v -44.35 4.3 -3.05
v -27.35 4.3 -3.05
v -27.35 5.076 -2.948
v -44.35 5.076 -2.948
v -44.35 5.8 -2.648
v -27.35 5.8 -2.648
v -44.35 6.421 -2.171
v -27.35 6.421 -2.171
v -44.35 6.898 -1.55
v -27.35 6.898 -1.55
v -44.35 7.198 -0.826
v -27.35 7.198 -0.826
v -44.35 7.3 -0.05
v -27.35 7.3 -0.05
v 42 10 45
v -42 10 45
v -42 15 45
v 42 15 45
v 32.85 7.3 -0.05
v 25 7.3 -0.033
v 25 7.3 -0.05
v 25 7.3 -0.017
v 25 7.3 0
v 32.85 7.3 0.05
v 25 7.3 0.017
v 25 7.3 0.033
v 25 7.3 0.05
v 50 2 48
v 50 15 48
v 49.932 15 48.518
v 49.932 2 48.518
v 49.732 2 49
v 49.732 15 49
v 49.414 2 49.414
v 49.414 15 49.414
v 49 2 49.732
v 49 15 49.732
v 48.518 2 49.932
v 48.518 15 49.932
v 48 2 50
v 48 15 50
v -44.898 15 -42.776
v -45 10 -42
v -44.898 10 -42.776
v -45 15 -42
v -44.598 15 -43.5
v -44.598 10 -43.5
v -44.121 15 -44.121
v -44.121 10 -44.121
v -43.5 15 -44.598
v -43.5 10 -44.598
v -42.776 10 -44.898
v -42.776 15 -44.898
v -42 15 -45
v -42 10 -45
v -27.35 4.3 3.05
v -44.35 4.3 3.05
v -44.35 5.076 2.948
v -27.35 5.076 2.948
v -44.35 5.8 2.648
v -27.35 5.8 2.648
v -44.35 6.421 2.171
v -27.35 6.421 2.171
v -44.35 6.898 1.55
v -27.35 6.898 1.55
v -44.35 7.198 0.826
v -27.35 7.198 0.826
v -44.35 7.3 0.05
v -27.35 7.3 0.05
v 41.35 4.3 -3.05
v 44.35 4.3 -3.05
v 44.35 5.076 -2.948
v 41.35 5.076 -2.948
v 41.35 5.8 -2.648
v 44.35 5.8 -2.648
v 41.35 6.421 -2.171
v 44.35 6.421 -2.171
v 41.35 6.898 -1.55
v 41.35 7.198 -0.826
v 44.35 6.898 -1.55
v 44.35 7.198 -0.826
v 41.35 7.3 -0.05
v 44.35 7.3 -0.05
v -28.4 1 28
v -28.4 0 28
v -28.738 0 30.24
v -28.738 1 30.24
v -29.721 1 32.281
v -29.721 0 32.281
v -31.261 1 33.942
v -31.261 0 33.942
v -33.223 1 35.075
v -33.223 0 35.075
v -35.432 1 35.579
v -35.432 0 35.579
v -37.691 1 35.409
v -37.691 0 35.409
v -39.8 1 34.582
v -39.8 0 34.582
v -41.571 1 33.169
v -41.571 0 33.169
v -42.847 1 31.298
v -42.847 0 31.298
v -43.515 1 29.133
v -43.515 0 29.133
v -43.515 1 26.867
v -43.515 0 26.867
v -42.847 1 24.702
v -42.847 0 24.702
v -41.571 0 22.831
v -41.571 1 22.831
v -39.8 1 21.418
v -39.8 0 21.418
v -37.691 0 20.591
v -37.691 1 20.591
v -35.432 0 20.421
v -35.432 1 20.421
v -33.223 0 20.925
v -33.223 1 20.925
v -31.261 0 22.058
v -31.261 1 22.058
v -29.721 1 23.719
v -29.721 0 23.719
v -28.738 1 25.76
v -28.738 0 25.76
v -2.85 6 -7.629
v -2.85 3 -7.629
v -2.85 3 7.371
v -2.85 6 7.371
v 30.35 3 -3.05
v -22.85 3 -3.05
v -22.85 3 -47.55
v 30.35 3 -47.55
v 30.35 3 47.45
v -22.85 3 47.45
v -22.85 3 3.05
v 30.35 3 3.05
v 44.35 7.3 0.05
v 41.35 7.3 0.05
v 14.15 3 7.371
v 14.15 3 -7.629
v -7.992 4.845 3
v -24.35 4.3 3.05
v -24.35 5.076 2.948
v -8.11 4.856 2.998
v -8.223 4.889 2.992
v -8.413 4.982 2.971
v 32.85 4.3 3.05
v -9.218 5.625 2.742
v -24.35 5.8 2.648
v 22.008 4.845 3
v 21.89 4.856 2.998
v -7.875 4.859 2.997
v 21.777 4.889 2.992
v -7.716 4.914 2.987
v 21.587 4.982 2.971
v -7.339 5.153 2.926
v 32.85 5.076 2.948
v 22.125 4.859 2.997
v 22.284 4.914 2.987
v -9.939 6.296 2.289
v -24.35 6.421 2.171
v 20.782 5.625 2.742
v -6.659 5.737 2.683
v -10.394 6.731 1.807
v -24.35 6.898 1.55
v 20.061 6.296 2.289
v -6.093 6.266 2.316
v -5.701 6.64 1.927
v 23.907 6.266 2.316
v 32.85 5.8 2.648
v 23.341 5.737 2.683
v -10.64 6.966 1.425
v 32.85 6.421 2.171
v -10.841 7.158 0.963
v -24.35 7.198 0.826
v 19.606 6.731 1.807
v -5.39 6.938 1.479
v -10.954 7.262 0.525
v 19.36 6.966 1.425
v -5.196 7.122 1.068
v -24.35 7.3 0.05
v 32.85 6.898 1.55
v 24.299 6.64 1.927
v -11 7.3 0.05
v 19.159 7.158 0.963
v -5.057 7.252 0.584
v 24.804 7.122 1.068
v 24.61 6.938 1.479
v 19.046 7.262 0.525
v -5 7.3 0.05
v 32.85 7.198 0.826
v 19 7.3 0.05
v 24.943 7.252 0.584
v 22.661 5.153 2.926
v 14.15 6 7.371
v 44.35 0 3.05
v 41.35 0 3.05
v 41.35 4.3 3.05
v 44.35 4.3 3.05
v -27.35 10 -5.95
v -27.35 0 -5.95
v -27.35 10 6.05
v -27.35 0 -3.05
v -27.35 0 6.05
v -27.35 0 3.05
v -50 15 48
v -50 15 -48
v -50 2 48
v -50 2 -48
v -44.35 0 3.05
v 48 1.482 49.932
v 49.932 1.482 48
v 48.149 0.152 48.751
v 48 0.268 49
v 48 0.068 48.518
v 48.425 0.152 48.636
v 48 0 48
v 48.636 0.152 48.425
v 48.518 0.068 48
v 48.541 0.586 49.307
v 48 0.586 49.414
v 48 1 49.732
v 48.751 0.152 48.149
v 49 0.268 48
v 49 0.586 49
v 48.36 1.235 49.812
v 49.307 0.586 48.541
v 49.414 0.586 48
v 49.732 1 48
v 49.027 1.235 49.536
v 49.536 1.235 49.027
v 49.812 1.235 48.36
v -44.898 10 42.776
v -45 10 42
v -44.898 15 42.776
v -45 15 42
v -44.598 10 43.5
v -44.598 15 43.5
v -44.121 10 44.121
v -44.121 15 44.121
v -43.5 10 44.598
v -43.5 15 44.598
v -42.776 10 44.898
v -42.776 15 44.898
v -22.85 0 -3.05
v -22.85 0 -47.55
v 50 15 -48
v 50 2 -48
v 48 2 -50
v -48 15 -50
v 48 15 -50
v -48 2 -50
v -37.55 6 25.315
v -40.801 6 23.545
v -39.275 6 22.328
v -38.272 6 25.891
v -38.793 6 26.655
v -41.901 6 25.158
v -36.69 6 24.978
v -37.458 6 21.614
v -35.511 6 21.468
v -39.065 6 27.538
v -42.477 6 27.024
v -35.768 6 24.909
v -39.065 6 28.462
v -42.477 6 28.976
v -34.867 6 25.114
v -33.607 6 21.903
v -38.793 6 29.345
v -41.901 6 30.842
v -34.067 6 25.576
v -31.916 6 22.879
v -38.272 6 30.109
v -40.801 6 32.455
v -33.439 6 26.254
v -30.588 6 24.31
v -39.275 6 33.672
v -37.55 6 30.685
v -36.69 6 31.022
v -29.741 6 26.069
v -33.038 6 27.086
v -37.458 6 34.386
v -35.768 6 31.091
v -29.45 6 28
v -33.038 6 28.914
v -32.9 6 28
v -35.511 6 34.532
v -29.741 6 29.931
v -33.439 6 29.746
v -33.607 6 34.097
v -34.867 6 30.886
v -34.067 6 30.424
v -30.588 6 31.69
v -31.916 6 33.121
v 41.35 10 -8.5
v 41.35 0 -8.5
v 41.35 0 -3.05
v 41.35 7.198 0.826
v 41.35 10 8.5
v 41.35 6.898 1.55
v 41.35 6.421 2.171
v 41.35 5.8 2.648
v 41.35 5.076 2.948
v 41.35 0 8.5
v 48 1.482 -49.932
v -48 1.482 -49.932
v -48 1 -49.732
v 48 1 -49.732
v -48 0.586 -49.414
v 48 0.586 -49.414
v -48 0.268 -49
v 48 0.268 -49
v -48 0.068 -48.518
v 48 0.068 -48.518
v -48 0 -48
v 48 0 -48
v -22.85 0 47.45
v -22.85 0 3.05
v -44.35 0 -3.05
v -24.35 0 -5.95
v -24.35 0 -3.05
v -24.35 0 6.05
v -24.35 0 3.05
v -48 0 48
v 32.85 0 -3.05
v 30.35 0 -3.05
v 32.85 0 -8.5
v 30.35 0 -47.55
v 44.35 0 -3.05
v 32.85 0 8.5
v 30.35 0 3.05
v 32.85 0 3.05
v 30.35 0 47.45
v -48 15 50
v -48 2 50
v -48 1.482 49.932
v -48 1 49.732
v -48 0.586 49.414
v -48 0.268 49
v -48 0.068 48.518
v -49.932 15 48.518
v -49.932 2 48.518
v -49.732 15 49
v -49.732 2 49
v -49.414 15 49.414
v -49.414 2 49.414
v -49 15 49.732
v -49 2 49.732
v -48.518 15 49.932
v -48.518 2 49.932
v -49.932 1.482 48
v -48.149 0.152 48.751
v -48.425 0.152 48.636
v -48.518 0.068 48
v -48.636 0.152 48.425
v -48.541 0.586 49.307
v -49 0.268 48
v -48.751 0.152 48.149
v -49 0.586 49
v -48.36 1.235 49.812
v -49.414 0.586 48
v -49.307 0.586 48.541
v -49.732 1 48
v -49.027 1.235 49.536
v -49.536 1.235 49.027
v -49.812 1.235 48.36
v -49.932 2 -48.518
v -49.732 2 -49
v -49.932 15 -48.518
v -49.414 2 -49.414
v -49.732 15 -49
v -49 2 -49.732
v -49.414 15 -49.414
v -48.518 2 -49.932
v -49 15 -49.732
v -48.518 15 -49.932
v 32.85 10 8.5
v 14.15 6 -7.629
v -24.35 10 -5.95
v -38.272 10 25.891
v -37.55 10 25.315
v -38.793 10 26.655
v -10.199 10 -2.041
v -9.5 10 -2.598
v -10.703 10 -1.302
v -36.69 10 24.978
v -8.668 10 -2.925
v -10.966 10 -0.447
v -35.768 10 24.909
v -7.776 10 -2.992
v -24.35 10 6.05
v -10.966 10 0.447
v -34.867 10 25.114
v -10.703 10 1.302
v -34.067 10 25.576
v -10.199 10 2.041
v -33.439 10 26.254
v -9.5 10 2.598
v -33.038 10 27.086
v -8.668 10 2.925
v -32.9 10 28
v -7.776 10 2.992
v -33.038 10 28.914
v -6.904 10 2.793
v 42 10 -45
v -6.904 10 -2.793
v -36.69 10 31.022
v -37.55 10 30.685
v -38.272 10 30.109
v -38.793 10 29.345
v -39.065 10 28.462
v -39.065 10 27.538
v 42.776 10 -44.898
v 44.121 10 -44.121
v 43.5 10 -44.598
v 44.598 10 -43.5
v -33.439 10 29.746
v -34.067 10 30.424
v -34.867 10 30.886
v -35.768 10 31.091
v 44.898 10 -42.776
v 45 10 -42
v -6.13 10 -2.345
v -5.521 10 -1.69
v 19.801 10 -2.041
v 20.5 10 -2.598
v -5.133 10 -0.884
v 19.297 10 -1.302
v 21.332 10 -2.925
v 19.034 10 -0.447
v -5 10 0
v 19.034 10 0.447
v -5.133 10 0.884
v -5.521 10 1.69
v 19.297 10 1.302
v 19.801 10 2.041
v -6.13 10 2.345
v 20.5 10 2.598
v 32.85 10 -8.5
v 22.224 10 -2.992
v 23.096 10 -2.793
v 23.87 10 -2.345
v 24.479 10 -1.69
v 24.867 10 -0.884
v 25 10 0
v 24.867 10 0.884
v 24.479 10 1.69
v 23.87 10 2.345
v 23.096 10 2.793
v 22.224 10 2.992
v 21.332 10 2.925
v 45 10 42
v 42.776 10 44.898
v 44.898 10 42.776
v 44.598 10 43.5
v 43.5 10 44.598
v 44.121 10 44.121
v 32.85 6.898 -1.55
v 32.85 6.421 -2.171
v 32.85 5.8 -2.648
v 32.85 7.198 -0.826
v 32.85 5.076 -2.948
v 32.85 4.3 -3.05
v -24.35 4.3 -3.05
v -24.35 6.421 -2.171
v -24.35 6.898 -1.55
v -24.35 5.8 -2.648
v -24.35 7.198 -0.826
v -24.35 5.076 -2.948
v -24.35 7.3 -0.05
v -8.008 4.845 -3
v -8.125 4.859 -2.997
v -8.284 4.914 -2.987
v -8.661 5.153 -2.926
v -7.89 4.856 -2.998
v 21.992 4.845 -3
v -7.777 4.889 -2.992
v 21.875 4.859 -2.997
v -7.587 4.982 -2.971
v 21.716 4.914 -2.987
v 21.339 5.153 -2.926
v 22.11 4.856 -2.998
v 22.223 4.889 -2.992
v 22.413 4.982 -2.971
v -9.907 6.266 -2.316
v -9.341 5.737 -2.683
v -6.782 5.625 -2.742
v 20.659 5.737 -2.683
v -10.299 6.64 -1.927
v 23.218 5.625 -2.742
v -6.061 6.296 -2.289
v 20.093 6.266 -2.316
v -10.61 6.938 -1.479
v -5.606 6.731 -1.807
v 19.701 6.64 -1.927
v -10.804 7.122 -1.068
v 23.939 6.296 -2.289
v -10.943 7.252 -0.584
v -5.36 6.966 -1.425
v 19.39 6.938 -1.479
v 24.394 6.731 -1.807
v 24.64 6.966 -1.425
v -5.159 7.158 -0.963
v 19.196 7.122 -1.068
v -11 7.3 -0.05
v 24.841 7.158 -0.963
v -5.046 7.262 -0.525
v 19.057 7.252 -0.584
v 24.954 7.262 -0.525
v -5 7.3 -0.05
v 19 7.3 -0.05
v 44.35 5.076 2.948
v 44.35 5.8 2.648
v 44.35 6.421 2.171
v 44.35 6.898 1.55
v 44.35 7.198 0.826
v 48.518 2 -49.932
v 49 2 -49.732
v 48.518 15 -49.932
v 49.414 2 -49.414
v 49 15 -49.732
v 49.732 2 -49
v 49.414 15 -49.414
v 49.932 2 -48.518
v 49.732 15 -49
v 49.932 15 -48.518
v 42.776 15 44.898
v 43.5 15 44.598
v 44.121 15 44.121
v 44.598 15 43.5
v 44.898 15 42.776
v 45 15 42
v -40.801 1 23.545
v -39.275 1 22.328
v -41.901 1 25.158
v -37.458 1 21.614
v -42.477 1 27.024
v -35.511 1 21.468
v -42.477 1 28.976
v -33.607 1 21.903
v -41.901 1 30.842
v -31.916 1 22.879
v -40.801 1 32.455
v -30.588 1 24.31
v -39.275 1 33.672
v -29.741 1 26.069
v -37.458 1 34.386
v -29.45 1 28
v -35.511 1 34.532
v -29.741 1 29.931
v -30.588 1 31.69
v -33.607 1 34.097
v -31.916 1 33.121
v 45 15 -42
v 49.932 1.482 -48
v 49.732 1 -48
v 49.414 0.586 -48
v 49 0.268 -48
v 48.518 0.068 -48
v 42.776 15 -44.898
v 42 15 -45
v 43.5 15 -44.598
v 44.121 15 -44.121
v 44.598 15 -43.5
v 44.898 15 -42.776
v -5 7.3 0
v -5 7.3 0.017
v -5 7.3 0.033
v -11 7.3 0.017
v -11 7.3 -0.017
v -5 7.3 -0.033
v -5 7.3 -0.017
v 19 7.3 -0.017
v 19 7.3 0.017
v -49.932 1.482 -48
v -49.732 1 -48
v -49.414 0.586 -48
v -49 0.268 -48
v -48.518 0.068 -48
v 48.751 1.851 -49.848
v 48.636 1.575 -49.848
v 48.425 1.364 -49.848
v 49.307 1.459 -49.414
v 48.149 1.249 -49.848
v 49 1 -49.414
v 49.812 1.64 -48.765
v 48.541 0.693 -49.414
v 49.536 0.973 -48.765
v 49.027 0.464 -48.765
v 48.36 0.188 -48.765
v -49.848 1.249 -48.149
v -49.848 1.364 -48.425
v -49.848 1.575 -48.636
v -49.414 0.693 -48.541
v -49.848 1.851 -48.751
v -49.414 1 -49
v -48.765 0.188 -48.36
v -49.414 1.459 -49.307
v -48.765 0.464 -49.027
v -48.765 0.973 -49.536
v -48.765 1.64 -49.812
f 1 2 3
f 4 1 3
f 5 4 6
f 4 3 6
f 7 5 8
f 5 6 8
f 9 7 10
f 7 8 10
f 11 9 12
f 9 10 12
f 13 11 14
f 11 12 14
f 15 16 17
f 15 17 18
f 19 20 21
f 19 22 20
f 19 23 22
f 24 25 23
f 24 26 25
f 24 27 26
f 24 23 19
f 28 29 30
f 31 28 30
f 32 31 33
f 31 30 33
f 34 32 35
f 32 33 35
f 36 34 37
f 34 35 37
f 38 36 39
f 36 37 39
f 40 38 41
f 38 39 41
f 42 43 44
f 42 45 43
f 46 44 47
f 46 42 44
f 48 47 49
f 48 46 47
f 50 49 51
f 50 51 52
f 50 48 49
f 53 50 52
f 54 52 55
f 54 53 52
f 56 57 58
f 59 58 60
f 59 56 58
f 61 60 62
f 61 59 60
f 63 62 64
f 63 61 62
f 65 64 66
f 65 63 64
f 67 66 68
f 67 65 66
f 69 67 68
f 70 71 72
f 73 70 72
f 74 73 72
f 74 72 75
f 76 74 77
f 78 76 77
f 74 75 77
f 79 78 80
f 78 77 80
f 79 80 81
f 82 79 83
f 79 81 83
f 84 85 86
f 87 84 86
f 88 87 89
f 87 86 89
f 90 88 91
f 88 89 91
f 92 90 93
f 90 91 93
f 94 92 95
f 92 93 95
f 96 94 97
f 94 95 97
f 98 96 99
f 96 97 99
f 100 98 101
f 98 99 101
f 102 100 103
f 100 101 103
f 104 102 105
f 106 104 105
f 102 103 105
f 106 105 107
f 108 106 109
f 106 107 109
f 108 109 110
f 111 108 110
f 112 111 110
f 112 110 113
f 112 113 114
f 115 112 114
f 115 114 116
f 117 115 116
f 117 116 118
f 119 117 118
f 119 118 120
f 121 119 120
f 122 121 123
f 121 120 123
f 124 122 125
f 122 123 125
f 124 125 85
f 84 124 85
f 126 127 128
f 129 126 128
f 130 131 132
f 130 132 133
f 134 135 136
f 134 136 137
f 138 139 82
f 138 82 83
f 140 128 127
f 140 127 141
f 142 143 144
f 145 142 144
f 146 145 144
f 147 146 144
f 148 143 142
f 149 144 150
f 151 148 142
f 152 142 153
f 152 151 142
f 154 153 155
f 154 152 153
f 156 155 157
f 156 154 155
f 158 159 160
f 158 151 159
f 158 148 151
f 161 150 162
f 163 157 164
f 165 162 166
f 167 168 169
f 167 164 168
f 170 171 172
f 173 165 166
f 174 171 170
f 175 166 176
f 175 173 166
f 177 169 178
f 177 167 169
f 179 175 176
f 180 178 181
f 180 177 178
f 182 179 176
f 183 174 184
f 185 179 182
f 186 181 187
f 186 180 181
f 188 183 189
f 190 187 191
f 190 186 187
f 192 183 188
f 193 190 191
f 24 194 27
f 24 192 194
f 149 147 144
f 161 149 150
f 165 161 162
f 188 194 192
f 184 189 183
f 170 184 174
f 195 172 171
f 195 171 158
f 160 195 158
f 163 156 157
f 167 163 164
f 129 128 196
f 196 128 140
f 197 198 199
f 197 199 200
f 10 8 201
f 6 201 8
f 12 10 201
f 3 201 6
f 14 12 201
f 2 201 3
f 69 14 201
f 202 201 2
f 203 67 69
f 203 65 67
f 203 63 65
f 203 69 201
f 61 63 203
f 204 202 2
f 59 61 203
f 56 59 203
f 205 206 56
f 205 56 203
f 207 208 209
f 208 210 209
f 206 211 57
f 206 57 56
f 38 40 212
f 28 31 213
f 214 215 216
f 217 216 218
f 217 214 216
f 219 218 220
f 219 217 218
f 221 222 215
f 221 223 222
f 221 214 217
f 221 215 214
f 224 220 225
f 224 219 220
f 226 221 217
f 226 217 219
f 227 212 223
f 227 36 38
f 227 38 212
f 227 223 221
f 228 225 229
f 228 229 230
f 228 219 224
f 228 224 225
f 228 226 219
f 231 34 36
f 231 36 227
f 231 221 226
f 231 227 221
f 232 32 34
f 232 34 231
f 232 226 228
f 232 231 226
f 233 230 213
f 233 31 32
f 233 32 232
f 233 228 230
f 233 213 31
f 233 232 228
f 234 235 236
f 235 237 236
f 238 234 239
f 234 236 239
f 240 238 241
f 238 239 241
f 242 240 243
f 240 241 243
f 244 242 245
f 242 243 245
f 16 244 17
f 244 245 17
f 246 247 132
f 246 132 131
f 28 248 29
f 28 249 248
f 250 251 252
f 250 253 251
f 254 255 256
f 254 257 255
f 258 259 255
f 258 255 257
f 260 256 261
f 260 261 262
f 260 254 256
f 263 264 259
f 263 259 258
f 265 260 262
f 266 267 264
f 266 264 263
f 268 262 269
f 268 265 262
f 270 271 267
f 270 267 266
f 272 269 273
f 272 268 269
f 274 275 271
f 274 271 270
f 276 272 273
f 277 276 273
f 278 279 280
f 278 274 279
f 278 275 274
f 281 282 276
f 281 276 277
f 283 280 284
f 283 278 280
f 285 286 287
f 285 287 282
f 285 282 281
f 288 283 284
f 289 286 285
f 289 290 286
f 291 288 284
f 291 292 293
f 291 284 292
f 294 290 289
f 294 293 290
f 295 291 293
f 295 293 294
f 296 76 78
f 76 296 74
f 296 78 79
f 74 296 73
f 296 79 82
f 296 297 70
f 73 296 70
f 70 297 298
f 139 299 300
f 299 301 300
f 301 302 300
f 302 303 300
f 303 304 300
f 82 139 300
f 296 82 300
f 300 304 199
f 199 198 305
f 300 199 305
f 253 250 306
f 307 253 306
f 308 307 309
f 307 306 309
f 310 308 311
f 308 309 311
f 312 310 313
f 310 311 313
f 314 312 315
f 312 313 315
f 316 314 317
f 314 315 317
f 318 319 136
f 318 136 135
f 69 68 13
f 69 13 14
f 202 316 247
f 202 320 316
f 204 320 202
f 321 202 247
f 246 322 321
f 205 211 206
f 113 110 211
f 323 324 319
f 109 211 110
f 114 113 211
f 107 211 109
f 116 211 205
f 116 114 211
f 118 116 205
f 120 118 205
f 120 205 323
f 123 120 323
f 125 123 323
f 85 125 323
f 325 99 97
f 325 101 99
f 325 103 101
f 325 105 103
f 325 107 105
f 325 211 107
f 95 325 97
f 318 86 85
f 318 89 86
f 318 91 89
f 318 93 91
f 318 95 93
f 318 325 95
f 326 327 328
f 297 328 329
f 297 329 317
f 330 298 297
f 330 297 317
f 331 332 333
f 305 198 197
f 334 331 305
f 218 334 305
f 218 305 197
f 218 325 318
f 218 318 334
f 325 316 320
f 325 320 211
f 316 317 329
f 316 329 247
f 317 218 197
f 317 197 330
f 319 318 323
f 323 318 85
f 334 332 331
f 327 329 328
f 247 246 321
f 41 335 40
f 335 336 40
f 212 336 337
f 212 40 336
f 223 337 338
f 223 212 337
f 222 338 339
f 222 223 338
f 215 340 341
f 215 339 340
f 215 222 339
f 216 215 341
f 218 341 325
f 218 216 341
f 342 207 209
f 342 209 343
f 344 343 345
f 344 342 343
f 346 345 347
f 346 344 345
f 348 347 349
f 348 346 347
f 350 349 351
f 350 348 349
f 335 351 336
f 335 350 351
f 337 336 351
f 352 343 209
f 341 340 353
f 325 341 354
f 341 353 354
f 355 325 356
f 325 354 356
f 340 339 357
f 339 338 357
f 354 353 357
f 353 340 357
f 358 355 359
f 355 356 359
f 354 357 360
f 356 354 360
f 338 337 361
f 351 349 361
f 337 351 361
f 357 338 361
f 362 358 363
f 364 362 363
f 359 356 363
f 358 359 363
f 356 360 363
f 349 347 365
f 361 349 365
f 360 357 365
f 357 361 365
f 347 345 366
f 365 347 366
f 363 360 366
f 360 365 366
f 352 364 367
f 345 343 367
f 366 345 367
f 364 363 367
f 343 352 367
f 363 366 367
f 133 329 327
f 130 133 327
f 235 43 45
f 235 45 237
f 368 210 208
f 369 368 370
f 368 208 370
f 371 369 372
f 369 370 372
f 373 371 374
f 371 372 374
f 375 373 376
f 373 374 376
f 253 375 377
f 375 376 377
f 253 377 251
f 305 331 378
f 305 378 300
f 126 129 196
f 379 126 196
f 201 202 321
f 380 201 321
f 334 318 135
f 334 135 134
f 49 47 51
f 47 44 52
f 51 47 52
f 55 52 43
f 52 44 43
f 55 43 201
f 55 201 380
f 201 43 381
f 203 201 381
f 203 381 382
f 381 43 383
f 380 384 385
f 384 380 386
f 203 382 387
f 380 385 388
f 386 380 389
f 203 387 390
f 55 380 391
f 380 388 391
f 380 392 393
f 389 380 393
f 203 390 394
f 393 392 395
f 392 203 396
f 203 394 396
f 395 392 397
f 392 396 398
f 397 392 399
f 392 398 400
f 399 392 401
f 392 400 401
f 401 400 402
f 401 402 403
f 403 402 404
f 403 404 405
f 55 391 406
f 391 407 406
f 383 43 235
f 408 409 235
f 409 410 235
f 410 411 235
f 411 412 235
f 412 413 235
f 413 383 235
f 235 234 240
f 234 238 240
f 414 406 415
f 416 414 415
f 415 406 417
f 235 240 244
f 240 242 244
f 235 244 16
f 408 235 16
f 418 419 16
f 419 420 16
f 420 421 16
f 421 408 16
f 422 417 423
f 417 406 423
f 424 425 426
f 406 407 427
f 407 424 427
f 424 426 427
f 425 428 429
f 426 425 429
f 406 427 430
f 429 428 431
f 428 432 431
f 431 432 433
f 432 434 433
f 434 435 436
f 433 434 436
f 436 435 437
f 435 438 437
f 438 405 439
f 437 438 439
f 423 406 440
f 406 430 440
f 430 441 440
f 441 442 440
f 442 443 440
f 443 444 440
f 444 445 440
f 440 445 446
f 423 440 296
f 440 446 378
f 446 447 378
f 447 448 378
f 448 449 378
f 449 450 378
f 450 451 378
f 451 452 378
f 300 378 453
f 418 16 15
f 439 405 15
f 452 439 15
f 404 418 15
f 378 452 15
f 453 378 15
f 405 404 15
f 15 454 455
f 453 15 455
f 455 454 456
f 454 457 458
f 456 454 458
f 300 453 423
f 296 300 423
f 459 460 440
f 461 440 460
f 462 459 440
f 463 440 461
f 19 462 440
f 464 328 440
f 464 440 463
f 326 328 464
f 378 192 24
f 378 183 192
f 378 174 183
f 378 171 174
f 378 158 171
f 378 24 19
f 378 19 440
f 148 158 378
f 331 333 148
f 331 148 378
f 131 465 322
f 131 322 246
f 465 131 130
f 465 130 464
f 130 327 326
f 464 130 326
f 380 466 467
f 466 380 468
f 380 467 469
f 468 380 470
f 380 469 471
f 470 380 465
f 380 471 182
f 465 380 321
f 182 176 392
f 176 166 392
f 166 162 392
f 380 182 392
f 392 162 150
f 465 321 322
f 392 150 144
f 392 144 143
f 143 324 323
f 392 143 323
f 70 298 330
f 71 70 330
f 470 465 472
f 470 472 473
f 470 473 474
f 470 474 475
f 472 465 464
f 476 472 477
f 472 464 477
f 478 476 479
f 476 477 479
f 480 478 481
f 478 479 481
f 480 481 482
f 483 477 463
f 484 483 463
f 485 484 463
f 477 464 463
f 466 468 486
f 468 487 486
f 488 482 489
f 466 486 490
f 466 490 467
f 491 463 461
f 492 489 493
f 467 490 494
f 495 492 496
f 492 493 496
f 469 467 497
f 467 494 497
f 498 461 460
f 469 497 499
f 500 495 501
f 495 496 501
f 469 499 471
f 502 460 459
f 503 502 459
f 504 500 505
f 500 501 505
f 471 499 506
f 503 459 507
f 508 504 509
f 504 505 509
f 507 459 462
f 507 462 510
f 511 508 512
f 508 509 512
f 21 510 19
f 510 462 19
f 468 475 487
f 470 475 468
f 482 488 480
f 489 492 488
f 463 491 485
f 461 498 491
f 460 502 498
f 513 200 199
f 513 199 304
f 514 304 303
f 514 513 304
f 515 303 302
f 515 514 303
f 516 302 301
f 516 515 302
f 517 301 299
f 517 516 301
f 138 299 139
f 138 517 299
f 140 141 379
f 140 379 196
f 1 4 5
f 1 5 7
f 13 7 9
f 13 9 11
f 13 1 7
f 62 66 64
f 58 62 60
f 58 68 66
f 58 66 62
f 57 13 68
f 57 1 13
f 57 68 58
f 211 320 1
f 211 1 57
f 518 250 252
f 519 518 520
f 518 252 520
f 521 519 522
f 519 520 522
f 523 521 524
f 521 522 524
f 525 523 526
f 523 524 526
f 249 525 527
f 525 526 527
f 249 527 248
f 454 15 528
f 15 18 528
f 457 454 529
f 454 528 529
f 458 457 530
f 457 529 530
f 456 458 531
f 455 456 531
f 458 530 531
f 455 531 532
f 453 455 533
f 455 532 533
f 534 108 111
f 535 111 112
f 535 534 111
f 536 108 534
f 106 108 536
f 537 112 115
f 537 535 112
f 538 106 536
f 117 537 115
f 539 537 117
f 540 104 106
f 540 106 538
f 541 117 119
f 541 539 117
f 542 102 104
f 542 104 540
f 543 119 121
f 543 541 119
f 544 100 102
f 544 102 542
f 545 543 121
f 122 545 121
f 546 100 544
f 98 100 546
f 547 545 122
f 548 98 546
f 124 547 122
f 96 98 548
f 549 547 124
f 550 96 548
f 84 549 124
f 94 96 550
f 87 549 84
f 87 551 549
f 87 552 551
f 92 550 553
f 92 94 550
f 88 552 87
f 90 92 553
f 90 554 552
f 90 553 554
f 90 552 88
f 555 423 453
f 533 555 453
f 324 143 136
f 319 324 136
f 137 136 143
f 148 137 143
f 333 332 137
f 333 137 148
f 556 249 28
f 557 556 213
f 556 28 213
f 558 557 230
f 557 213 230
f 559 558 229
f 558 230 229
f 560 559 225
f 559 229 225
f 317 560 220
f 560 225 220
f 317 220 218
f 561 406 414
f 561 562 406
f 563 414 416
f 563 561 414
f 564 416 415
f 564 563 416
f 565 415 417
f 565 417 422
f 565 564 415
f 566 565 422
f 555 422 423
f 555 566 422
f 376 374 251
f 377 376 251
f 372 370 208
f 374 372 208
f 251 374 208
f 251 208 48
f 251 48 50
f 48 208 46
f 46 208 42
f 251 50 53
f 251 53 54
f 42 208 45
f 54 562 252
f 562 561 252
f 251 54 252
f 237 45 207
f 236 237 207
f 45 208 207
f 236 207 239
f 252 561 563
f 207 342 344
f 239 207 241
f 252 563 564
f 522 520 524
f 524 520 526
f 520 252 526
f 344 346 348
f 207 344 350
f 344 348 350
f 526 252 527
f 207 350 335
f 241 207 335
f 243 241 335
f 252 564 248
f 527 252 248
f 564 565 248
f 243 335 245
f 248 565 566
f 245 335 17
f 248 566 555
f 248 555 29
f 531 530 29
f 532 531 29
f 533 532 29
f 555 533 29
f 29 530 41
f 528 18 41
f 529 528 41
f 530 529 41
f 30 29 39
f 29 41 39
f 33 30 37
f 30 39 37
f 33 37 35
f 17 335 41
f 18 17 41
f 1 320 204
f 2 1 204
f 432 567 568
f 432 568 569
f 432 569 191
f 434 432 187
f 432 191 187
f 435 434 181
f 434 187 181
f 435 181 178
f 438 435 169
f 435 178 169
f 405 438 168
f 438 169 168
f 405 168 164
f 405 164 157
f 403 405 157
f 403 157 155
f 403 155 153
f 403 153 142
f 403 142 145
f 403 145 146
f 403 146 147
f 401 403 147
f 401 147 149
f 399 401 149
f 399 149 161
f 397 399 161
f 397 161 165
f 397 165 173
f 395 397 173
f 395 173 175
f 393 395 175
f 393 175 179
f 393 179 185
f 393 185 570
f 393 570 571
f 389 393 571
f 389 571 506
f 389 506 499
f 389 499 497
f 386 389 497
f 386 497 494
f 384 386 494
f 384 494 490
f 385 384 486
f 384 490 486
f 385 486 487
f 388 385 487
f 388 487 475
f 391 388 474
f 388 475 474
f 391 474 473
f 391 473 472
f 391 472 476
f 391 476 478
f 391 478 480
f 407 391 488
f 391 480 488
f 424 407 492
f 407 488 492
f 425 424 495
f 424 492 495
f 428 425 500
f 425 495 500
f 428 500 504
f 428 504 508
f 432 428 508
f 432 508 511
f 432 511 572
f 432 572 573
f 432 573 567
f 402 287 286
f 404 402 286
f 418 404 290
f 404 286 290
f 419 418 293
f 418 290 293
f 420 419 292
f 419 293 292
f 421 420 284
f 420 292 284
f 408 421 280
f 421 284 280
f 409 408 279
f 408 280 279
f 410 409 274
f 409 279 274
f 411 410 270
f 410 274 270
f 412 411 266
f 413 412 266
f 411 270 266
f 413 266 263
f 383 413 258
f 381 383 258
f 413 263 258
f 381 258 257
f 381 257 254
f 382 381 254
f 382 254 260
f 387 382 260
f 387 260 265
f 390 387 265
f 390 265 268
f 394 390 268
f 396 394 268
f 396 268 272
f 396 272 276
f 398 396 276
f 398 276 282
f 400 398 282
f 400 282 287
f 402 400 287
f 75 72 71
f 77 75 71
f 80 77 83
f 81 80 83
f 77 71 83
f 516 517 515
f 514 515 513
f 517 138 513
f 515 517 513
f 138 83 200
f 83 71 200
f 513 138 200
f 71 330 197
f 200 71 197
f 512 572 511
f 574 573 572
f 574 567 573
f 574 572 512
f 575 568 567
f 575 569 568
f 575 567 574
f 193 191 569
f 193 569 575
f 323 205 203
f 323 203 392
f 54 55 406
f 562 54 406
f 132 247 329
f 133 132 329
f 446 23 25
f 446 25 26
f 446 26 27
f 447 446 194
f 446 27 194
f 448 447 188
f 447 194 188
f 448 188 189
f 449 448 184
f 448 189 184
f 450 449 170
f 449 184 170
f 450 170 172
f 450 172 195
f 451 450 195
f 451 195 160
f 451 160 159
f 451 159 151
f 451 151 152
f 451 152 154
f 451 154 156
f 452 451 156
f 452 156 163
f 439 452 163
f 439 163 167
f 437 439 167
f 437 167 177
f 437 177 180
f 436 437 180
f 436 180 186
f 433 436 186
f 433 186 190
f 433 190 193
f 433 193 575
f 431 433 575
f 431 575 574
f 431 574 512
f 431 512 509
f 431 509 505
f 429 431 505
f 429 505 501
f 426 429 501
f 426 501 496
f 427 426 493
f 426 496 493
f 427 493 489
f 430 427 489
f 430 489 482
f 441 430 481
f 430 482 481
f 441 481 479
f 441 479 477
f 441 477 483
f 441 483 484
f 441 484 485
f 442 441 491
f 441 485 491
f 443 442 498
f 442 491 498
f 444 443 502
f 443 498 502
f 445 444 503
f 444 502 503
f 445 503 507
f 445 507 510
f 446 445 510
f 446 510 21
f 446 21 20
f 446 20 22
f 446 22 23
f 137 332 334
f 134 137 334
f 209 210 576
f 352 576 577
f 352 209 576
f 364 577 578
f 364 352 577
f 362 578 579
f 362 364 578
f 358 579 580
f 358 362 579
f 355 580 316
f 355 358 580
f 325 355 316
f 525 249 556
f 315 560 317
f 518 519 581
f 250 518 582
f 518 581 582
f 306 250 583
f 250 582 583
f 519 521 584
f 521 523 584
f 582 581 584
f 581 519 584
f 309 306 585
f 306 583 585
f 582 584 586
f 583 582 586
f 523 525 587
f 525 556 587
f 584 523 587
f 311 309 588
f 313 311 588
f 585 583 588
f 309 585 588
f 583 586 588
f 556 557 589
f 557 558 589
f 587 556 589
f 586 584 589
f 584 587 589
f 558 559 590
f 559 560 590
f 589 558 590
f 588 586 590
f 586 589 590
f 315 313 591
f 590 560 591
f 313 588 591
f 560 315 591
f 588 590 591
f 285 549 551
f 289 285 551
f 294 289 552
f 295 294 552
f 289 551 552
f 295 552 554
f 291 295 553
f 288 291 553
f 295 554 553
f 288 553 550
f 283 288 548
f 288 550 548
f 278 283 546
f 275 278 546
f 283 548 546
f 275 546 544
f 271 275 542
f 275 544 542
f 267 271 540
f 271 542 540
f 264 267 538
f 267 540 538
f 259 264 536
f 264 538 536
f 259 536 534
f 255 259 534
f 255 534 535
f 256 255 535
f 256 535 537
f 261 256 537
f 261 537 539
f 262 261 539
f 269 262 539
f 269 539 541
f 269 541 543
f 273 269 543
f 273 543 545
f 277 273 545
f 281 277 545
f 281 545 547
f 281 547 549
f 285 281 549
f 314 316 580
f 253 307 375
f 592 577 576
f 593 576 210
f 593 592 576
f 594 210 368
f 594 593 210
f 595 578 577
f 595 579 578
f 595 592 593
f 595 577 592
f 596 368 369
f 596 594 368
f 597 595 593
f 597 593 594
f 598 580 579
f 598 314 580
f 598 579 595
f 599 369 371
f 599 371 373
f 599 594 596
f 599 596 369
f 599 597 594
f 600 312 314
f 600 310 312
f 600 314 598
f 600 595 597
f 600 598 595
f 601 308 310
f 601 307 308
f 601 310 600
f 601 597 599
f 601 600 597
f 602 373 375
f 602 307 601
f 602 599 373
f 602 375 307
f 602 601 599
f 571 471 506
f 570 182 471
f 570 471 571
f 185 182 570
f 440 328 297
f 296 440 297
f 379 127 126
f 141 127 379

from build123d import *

# Parameters (mm, degrees)
F0_W      = 100
F0_H      = 100
F1_DEPTH  = 15
F2_R      = 2
F3_W      = 88.7
F3_H      = 6.1
F4_DEPTH  = 7.3
F5_R      = 3
F6_R      = 3
F7_DEPTH  = 16
F8_W      = 53.2
F8_H      = 95
F9_DEPTH  = 3
F11_START = -3
F10_W     = 17
F10_H     = 15
F11_DEPTH = 3
F12_W     = 8.5
F12_H     = 17
F13_DEPTH = 16
F14_W     = 3
F14_H     = 12
F15_DEPTH = 16
F16_R     = 3.1
F17_DEPTH = 16
F18_R     = 6.55
F19_DEPTH = 6
F20_R     = 7.6
F21_DEPTH = 1
F23_START = -10
F22_W     = 90
F22_H     = 90
F23_DEPTH = 6
F24_R     = 3


with BuildPart() as f1:
    # F0 (on Front) → F1 (new body)
    with BuildSketch(Plane.XZ):
        Rectangle(F0_W, F0_H)
    extrude(amount=-F1_DEPTH)

    # F2
    f2_edges = [f1.edges().sort_by_distance(p)[0] for p in [
        (-50, 7.5, 50),
        (50, 7.5, 50),
        (0, 0, 50),
        (50, 0, 0),
        (50, 7.5, -50),
        (0, 0, -50),
        (-50, 0, 0),
        (-50, 7.5, -50),
    ]]
    fillet(f2_edges, radius=F2_R)

    # F3 (on Front) → F4 (cut)
    with BuildSketch(Plane.XZ):
        Rectangle(F3_W, F3_H)
    extrude(amount=-F4_DEPTH, mode=Mode.SUBTRACT)

    # F5
    f5_edges = [f1.edges().sort_by_distance(p)[0] for p in [
        (0, 7.3, -3.05),
        (0, 7.3, 3.05),
    ]]
    fillet(f5_edges, radius=F5_R)

    # F6 (on Front) → F7 (cut)
    with BuildSketch(Plane.XZ):
        with Locations((-8, 0)):
            Circle(F6_R)
        with Locations((22, 0)):
            Circle(F6_R)
    extrude(amount=-F7_DEPTH, mode=Mode.SUBTRACT)

    # F8 (on Front) → F9 (cut)
    with BuildSketch(Plane.XZ):
        with Locations((3.75, -0.05)):
            Rectangle(F8_W, F8_H)
    extrude(amount=-F9_DEPTH, mode=Mode.SUBTRACT)

    # F12 (on Front) → F13 (cut)
    with BuildSketch(Plane.XZ):
        with Locations((37.1, 0)):
            Rectangle(F12_W, F12_H)
    extrude(amount=-F13_DEPTH, mode=Mode.SUBTRACT)

    # F14 (on Front) → F15 (cut)
    with BuildSketch(Plane.XZ):
        with Locations((-25.85, 0.05)):
            Rectangle(F14_W, F14_H)
    extrude(amount=-F15_DEPTH, mode=Mode.SUBTRACT)

    # F16 (on Front) → F17 (cut)
    with BuildSketch(Plane.XZ):
        with Locations((-36, 28)):
            Circle(F16_R)
    extrude(amount=-F17_DEPTH, mode=Mode.SUBTRACT)

    # F18 (on Front) → F19 (cut)
    with BuildSketch(Plane.XZ):
        with Locations((-36, 28)):
            Circle(F18_R)
    extrude(amount=-F19_DEPTH, mode=Mode.SUBTRACT)

    # F20 (on Front) → F21 (cut)
    with BuildSketch(Plane.XZ):
        with Locations((-36, 28)):
            Circle(F20_R)
    extrude(amount=-F21_DEPTH, mode=Mode.SUBTRACT)

    # F22 (on Front) → F23 (cut)
    with BuildSketch(Plane.XZ.offset(F23_START)):
        Rectangle(F22_W, F22_H)
    extrude(amount=-F23_DEPTH, mode=Mode.SUBTRACT)

    # F24
    f24_edges = [f1.edges().sort_by_distance(p)[0] for p in [
        (45, 12.5, -45),
        (45, 12.5, 45),
        (-45, 12.5, -45),
        (-45, 12.5, 45),
    ]]
    fillet(f24_edges, radius=F24_R)


with BuildPart() as f11:
    # F10 (on Front) → F11 (new body)
    with BuildSketch(Plane.XZ.offset(F11_START)):
        with Locations((5.65, -0.1290466171)):
            Rectangle(F10_W, F10_H)
    extrude(amount=-F11_DEPTH)


solid = Compound([f1.part, f11.part])
